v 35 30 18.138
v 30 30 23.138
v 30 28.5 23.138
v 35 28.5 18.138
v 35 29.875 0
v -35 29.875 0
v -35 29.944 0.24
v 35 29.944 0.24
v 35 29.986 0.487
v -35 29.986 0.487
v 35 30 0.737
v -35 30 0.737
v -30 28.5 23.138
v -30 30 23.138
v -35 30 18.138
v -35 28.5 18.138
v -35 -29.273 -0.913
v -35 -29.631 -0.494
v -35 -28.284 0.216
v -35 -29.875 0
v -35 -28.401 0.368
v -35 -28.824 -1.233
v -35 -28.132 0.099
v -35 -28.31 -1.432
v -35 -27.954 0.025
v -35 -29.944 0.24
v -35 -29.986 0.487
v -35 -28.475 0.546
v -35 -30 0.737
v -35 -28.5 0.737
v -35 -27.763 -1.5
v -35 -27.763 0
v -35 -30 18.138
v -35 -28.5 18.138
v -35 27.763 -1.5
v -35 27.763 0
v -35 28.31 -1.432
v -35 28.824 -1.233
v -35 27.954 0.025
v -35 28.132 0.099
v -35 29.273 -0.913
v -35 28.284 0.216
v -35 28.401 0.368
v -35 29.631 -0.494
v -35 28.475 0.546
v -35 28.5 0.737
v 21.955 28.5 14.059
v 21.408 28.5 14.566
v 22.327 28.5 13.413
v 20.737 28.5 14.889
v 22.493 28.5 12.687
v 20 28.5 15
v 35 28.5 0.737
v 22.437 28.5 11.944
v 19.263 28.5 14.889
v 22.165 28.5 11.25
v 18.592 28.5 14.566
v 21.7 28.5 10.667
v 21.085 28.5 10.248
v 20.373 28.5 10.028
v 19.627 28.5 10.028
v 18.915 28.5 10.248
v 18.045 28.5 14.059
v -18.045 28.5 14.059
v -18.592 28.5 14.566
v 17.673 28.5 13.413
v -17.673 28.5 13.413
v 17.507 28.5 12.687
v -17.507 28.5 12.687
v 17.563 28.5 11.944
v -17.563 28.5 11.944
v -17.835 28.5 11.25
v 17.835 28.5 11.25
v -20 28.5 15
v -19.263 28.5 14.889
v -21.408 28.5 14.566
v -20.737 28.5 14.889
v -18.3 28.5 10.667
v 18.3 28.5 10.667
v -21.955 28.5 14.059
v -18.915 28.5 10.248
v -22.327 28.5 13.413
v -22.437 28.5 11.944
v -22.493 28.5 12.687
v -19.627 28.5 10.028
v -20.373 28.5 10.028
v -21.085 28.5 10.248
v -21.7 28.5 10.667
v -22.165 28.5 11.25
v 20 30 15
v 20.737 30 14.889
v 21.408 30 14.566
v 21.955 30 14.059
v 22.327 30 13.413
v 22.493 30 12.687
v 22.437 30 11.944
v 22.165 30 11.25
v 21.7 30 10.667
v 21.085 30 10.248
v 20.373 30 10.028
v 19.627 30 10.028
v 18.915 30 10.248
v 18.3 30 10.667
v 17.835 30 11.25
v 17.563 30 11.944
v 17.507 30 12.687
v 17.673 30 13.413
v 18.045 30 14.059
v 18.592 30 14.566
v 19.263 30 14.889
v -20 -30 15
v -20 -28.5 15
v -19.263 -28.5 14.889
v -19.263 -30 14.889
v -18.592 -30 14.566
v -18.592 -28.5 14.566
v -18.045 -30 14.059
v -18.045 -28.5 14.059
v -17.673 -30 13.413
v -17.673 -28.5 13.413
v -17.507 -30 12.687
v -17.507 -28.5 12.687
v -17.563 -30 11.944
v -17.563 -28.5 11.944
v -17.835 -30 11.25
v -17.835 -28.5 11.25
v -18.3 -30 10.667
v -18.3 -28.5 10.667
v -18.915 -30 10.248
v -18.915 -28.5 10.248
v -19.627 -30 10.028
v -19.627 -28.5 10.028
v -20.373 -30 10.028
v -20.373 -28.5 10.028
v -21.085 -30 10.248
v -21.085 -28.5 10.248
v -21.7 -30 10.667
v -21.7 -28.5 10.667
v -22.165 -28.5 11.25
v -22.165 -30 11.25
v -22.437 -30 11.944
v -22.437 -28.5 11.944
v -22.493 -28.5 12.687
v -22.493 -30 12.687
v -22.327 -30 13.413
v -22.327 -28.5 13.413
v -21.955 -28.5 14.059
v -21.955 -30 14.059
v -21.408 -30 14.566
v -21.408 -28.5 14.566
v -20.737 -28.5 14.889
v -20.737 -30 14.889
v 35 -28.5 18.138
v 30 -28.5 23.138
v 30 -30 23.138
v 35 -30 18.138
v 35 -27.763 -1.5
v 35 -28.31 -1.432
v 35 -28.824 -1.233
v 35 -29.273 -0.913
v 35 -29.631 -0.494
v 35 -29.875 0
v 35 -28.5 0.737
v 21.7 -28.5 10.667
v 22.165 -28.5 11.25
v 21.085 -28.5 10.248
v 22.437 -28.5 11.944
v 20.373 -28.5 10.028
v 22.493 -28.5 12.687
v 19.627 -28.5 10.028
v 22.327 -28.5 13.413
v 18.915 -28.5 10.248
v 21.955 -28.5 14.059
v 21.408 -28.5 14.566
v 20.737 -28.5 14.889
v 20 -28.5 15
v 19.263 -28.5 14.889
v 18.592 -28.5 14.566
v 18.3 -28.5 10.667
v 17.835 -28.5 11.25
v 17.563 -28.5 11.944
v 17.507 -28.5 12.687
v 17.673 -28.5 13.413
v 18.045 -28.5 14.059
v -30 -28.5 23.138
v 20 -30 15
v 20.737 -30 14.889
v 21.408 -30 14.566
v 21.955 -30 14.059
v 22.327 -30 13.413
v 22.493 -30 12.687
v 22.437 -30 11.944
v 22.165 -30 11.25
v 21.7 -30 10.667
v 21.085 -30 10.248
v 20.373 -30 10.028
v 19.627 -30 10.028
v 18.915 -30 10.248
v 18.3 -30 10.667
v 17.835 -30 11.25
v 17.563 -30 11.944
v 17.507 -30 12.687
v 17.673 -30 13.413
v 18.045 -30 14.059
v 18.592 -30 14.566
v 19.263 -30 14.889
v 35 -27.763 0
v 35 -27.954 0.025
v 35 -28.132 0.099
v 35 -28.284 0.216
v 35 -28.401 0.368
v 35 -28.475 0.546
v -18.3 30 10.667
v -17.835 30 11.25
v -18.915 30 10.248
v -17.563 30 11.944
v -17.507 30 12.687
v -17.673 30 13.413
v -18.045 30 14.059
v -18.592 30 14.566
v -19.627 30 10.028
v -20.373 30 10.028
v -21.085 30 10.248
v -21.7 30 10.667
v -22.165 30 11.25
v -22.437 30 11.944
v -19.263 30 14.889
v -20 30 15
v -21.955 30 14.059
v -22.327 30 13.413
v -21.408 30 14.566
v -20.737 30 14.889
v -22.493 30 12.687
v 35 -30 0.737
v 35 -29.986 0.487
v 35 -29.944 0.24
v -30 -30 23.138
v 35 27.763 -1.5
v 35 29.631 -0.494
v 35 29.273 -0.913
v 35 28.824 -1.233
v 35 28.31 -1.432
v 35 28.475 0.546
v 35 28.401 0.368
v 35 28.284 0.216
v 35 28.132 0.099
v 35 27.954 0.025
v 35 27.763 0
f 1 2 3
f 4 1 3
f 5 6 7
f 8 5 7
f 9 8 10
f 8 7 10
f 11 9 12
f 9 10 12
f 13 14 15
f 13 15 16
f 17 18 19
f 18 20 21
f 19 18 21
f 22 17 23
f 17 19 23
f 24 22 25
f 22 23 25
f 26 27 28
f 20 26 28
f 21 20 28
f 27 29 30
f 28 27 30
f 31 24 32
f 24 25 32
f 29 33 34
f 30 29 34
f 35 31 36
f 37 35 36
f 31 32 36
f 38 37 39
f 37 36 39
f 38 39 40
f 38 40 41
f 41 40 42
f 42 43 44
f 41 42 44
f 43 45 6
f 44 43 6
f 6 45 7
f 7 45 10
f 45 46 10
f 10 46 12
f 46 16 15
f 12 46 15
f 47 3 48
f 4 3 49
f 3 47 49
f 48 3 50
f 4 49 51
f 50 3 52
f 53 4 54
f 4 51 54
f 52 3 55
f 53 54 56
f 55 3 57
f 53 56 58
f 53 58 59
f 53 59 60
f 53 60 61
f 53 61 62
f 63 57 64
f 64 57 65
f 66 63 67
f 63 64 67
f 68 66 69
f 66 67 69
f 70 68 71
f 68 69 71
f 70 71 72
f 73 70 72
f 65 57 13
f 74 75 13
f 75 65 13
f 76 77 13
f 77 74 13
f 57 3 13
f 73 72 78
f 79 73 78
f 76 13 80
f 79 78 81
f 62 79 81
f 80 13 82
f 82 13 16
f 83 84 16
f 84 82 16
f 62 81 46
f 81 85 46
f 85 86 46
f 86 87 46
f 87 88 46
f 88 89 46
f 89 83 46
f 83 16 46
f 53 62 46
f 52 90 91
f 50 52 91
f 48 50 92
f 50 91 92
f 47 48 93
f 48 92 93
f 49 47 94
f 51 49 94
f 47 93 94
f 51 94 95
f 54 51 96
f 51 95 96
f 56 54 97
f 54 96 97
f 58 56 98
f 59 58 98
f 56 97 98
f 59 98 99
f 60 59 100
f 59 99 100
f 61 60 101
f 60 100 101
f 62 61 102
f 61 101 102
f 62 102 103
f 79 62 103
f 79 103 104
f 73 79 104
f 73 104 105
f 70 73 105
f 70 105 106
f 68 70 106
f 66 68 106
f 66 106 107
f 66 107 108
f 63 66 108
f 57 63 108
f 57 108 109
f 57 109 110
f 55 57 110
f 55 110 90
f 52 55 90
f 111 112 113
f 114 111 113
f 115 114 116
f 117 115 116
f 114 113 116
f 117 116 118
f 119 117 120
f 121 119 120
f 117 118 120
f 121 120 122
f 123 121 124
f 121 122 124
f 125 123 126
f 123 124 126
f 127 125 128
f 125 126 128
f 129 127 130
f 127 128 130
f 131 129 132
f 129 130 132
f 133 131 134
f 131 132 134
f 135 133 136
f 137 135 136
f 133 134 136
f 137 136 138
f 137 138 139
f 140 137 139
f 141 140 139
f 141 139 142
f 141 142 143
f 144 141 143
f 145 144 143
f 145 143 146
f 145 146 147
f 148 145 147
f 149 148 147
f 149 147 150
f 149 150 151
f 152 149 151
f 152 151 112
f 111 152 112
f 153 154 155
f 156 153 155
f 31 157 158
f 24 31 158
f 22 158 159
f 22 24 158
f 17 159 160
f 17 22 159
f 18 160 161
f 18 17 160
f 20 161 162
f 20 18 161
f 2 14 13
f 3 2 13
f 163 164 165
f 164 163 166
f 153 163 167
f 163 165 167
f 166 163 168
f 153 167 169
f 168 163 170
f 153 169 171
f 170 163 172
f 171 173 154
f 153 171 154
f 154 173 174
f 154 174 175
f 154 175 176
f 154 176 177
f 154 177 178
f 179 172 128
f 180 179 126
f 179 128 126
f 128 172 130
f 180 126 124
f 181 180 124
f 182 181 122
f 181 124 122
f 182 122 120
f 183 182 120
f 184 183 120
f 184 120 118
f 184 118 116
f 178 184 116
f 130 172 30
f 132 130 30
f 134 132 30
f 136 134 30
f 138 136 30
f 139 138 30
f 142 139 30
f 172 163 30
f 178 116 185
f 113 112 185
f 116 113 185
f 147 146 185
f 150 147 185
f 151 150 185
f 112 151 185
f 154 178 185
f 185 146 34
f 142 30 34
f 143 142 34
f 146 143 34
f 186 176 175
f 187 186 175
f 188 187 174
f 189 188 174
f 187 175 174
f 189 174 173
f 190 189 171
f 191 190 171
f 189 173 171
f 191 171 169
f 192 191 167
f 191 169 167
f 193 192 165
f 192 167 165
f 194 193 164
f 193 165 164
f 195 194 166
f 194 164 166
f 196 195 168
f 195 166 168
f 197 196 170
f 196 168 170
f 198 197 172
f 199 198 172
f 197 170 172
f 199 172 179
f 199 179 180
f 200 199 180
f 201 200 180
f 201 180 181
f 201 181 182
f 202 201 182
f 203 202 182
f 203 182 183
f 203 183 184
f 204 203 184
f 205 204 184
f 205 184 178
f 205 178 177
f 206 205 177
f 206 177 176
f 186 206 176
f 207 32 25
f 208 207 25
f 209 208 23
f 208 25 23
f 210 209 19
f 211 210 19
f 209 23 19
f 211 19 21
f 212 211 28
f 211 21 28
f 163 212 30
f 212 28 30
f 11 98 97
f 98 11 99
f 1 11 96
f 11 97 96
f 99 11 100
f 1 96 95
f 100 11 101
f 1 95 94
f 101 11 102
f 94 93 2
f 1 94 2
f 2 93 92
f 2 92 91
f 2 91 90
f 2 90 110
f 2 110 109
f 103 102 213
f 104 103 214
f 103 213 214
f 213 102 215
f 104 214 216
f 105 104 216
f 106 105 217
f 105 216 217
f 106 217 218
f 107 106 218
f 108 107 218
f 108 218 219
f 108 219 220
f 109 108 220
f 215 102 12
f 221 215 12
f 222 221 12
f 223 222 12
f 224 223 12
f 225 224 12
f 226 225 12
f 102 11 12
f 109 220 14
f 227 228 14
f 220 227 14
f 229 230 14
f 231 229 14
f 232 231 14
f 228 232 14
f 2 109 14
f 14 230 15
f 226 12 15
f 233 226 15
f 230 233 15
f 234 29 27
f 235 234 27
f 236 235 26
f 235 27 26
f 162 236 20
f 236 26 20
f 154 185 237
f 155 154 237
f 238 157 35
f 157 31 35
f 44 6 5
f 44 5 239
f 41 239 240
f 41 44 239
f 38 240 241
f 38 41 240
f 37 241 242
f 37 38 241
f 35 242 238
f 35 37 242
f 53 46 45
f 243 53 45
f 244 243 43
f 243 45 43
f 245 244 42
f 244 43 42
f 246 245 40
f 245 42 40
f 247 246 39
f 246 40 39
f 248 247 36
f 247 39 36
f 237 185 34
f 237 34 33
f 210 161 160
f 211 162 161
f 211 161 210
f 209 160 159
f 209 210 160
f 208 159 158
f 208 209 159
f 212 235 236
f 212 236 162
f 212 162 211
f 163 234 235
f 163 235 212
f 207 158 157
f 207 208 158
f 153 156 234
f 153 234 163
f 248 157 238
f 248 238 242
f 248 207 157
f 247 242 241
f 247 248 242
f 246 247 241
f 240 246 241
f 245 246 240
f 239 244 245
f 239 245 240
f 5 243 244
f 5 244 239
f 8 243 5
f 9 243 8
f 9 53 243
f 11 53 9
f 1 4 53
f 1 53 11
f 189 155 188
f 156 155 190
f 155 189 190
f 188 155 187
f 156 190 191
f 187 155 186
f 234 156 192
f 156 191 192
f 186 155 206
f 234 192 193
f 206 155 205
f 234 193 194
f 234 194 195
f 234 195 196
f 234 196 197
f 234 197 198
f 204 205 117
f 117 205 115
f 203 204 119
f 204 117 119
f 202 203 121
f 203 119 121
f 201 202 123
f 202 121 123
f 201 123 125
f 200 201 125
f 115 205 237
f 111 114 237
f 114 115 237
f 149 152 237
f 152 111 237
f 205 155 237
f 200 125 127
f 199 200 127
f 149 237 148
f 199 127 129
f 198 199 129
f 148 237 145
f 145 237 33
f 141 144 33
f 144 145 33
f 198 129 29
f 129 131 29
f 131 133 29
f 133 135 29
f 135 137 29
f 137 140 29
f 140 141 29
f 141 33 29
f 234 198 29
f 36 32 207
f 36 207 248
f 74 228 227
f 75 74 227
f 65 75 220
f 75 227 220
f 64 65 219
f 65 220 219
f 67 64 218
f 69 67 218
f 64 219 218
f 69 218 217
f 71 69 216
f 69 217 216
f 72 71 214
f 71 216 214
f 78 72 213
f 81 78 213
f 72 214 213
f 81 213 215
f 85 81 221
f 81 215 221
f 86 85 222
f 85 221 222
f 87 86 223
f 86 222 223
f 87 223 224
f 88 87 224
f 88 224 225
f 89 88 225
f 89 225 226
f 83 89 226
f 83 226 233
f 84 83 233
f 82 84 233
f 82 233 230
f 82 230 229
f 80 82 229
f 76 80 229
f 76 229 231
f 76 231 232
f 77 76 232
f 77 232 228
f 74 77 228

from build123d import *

# Parameters (mm, degrees)
BASE_FLANGE1_DEPTH     = 1.5
SKETCHED_START         = -35
SKETCHED_BEND1_DEPTH   = 70
SKETCHED_BEND1_2_DEPTH = 70
CHAMFER1_SIZE          = 5
SKETCH7_R              = 2.5
CUT_EXTRUDE1_DEPTH     = 74.21454467


# Read off the part's stored shape, not the designer's step: Sketched Bend1
# Sheet-metal steps are written as plain solids
with BuildPart() as part:
    # Sketch1 → Base-Flange1 (new body)
    with BuildSketch(Plane(origin=(0, 0, 0), x_dir=(0, 1, 0), z_dir=(0, 0, 1))):
        Polygon((-30, -35), (30, -35), (52.5, -35), (52.5, 35), (30, 35), (-30, 35), (-52.5, 35), (-52.5, -35), align=None)
    extrude(amount=-BASE_FLANGE1_DEPTH)

    # Sketched Bend1 outline → Sketched Bend1 (cut)
    with BuildSketch(Plane.YZ.offset(SKETCHED_START)):
        with BuildLine():
            ThreePointArc((29.875223856, 0), (29.058564082, -1.086838938), (27.7634, -1.5))
            Line((27.7634, -1.5), (52.5, -1.5))
            Line((52.5, -1.5), (52.5, 0))
            Line((52.5, 0), (29.875223856, 0))
        make_face()
        with BuildLine():
            Line((-52.5, -1.5), (-27.7634, -1.5))
            ThreePointArc((-27.7634, -1.5), (-29.058564082, -1.086838938), (-29.875223856, 0))
            Line((-29.875223856, 0), (-52.5, 0))
            Line((-52.5, 0), (-52.5, -1.5))
        make_face()
    extrude(amount=SKETCHED_BEND1_DEPTH, mode=Mode.SUBTRACT)

    # Sketched Bend1 2 outline → Sketched Bend1 2 (add)
    with BuildSketch(Plane.YZ.offset(SKETCHED_START)):
        with BuildLine():
            Line((27.7634, 0), (29.875223856, 0))
            ThreePointArc((29.875223856, 0), (29.968585343, 0.363053267), (30, 0.7366))
            Line((30, 0.7366), (30, 23.138054181))
            Line((30, 23.138054181), (28.5, 23.138054181))
            Line((28.5, 23.138054181), (28.5, 0.7366))
            ThreePointArc((28.5, 0.7366), (28.284254855, 0.215745145), (27.7634, 0))
        make_face()
        with BuildLine():
            ThreePointArc((-30, 0.7366), (-29.968585343, 0.363053267), (-29.875223856, 0))
            Line((-29.875223856, 0), (-27.7634, 0))
            ThreePointArc((-27.7634, 0), (-28.284254855, 0.215745145), (-28.5, 0.7366))
            Line((-28.5, 0.7366), (-28.5, 23.138054181))
            Line((-28.5, 23.138054181), (-30, 23.138054181))
            Line((-30, 23.138054181), (-30, 0.7366))
        make_face()
    extrude(amount=SKETCHED_BEND1_2_DEPTH)

    # Chamfer1
    chamfer1_edges = [part.edges().sort_by_distance(p)[0] for p in [
        (35, -29.25, 23.138054181),
        (-35, -29.25, 23.138054181),
        (-35, 29.25, 23.138054181),
        (35, 29.25, 23.138054181),
    ]]
    chamfer(chamfer1_edges, length=CHAMFER1_SIZE)

    # Sketch7 → Cut-Extrude1 (cut, through all)
    with BuildSketch(Plane(origin=(0, 30, 0), x_dir=(-1, 0, 0), z_dir=(0, 1, 0))):
        with Locations(Location((-20, 12.5, 0), (0, 0, 90))):
            Circle(SKETCH7_R)
        with Locations(Location((20, 12.5, 0), (0, 0, 90))):
            Circle(SKETCH7_R)
    extrude(amount=-CUT_EXTRUDE1_DEPTH, mode=Mode.SUBTRACT)


solid = part.part
